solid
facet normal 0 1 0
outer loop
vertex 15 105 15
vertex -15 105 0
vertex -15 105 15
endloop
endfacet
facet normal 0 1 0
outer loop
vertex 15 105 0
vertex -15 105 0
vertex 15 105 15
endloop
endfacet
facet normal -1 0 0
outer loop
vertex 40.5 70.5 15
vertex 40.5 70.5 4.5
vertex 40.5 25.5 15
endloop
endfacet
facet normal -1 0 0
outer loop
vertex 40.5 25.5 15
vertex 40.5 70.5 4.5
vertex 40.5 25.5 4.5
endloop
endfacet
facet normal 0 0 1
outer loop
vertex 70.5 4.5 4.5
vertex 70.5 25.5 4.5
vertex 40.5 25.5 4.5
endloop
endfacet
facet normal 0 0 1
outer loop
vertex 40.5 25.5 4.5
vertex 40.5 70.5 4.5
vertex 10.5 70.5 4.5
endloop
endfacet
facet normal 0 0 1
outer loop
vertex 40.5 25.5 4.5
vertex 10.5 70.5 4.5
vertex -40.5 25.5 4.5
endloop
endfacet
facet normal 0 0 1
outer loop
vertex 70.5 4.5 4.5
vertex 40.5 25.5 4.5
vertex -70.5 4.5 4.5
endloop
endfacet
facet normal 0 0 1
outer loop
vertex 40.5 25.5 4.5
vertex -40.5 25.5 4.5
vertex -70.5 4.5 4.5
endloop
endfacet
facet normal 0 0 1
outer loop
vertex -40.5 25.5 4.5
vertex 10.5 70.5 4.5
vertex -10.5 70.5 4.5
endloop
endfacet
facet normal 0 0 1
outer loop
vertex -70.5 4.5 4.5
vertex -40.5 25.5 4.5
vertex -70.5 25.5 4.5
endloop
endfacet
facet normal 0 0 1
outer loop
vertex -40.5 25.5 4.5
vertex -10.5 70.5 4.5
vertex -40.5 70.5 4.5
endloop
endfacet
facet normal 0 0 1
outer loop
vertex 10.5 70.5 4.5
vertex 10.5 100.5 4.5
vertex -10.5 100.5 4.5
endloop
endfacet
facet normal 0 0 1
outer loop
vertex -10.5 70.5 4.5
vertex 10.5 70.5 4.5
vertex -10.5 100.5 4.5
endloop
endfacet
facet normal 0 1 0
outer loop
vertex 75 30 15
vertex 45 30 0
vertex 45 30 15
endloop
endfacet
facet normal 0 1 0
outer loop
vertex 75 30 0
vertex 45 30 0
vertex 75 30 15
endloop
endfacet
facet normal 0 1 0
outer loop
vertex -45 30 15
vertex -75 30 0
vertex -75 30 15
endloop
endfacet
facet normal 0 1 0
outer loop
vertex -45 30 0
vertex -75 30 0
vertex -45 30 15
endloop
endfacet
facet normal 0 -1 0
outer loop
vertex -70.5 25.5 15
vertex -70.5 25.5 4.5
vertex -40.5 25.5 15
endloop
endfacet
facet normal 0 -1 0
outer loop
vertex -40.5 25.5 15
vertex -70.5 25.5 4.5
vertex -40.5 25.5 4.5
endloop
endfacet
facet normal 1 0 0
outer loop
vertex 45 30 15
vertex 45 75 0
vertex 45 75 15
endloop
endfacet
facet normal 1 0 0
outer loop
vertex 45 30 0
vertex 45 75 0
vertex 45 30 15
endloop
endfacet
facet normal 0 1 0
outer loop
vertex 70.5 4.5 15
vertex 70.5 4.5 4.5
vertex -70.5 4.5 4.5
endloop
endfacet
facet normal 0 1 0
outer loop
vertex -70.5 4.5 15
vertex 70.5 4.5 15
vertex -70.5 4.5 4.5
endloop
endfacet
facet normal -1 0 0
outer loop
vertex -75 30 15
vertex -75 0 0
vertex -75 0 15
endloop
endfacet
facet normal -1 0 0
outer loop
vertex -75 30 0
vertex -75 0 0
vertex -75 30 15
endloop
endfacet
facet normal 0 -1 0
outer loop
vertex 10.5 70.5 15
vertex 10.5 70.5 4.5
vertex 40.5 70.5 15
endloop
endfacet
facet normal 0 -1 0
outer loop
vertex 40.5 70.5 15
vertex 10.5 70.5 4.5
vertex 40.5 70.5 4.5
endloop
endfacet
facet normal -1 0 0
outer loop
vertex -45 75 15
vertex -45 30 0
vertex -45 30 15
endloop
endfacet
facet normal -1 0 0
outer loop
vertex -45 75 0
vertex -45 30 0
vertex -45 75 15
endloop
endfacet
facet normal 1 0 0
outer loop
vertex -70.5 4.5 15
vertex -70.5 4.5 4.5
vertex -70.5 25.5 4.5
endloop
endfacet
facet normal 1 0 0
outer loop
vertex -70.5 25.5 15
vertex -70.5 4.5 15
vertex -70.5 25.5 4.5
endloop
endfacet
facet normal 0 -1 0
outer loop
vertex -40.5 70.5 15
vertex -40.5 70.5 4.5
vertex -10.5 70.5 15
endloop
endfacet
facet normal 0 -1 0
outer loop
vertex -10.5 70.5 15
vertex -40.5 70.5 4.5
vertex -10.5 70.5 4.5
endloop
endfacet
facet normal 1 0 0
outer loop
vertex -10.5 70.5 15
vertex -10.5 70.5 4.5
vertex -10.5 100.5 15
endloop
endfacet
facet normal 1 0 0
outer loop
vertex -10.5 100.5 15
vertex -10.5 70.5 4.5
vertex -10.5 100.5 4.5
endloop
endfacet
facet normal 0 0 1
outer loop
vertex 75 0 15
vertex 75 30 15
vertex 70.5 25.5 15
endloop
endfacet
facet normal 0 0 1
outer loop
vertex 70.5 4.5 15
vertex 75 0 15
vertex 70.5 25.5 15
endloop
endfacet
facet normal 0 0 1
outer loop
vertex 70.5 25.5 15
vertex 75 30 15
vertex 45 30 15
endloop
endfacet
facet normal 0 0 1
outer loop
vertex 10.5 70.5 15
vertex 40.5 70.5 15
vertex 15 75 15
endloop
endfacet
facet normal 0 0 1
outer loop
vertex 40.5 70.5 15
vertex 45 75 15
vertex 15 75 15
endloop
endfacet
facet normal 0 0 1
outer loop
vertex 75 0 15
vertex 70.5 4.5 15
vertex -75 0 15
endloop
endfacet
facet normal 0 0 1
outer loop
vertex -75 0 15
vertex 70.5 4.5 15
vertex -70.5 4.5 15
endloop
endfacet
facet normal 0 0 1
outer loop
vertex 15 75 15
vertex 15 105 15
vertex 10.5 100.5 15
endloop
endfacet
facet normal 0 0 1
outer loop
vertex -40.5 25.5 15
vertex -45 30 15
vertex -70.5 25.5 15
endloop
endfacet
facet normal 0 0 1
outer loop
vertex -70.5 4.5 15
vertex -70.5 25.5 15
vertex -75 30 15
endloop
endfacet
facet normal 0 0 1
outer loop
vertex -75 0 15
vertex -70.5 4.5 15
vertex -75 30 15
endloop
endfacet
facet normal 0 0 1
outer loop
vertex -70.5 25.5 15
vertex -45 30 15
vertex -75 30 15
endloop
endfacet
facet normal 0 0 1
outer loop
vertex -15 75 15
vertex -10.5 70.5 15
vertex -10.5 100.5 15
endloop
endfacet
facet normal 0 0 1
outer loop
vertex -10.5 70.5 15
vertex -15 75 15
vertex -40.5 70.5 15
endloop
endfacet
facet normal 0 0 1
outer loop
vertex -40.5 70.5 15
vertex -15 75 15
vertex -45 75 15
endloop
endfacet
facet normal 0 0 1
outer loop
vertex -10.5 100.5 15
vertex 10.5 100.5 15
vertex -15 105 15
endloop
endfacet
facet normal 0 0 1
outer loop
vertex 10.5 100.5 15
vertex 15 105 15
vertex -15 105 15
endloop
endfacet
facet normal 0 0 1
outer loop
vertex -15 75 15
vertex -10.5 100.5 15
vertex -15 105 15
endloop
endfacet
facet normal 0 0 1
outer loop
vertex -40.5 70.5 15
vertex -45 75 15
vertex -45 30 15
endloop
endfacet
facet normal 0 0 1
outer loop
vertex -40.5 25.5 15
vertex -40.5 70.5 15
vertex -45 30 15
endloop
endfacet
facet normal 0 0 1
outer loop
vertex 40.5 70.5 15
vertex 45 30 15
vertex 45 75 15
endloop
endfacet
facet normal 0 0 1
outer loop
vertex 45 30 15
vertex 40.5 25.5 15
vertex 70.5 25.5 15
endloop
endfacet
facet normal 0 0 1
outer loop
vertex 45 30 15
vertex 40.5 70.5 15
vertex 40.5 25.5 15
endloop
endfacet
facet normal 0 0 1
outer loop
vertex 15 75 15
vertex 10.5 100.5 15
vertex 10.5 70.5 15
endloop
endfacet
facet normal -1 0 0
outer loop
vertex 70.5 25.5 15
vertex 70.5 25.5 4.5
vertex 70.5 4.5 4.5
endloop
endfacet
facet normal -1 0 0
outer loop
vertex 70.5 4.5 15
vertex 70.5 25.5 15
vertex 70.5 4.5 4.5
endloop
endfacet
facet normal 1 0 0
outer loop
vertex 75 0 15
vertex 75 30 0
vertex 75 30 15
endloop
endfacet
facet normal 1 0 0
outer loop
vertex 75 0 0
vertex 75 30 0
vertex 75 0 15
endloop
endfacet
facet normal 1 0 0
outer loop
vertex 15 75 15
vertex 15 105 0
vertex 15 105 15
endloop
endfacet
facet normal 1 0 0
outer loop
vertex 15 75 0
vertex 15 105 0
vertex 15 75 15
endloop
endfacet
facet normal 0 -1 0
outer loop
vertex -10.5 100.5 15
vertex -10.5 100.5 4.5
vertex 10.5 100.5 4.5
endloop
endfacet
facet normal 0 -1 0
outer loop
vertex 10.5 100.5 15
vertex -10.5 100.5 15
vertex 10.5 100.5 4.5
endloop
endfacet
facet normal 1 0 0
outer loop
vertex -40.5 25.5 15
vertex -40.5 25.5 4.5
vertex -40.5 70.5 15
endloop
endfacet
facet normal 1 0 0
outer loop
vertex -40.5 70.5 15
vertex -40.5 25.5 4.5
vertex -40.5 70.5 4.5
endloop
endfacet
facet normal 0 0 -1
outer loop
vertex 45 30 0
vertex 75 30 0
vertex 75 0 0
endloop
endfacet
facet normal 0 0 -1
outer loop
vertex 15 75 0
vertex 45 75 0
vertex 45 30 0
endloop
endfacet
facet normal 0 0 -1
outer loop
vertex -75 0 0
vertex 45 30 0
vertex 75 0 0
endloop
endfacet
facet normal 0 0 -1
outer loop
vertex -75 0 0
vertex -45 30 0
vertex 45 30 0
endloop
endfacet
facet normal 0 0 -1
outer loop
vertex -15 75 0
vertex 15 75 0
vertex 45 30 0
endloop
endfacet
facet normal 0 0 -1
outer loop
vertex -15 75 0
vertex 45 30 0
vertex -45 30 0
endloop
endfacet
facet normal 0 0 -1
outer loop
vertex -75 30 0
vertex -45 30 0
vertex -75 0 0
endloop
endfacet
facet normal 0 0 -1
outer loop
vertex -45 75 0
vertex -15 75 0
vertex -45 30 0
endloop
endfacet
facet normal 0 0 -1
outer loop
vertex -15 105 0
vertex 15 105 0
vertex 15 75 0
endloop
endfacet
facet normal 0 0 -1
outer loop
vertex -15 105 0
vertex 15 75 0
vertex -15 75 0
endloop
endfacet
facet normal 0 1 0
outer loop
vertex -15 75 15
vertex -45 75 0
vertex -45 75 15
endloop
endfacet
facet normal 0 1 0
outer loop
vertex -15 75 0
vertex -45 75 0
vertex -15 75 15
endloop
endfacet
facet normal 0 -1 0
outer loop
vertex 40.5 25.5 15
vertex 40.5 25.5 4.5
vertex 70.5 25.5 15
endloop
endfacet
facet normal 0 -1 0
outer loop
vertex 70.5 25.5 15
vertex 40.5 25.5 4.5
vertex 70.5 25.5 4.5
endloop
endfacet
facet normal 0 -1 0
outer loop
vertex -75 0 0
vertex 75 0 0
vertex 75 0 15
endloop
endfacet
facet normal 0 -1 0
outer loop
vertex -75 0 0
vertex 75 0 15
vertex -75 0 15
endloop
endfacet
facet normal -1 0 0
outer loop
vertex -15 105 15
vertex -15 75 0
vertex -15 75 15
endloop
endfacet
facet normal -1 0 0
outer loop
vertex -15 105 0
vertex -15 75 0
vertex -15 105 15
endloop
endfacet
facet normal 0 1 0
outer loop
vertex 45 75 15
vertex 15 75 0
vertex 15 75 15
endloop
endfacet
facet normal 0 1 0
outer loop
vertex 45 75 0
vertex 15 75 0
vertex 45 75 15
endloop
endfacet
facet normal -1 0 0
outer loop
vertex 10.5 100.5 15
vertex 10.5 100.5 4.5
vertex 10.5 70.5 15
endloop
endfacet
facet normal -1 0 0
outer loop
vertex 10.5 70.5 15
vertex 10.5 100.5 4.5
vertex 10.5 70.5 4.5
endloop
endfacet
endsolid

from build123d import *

# Parameters (mm, degrees)
BOSS_EXTRUDE1_DEPTH = 15
BOSS_EXTRUDE2_DEPTH = 4.5


with BuildPart() as part:
    # Sketch1 → Boss-Extrude1 (new body)
    with BuildSketch(Plane.XY):
        Polygon((75, 0), (-75, 0), (-75, 30), (-45, 30), (-45, 75), (-15, 75), (-15, 105), (15, 105), (15, 75), (45, 75), (45, 30), (75, 30), align=None)
        Polygon((-70.5, 4.5), (-70.5, 25.5), (-40.5, 25.5), (-40.5, 70.5), (-10.5, 70.5), (-10.5, 100.5), (10.5, 100.5), (10.5, 70.5), (40.5, 70.5), (40.5, 25.5), (70.5, 25.5), (70.5, 4.5), align=None, mode=Mode.SUBTRACT)
    extrude(amount=BOSS_EXTRUDE1_DEPTH)

    # Sketch1<2> → Boss-Extrude2 (add)
    with BuildSketch(Plane.XY):
        Polygon((-70.5, 4.5), (-70.5, 25.5), (-40.5, 25.5), (-40.5, 70.5), (-10.5, 70.5), (-10.5, 100.5), (10.5, 100.5), (10.5, 70.5), (40.5, 70.5), (40.5, 25.5), (70.5, 25.5), (70.5, 4.5), align=None)
    extrude(amount=BOSS_EXTRUDE2_DEPTH)


solid = part.part
